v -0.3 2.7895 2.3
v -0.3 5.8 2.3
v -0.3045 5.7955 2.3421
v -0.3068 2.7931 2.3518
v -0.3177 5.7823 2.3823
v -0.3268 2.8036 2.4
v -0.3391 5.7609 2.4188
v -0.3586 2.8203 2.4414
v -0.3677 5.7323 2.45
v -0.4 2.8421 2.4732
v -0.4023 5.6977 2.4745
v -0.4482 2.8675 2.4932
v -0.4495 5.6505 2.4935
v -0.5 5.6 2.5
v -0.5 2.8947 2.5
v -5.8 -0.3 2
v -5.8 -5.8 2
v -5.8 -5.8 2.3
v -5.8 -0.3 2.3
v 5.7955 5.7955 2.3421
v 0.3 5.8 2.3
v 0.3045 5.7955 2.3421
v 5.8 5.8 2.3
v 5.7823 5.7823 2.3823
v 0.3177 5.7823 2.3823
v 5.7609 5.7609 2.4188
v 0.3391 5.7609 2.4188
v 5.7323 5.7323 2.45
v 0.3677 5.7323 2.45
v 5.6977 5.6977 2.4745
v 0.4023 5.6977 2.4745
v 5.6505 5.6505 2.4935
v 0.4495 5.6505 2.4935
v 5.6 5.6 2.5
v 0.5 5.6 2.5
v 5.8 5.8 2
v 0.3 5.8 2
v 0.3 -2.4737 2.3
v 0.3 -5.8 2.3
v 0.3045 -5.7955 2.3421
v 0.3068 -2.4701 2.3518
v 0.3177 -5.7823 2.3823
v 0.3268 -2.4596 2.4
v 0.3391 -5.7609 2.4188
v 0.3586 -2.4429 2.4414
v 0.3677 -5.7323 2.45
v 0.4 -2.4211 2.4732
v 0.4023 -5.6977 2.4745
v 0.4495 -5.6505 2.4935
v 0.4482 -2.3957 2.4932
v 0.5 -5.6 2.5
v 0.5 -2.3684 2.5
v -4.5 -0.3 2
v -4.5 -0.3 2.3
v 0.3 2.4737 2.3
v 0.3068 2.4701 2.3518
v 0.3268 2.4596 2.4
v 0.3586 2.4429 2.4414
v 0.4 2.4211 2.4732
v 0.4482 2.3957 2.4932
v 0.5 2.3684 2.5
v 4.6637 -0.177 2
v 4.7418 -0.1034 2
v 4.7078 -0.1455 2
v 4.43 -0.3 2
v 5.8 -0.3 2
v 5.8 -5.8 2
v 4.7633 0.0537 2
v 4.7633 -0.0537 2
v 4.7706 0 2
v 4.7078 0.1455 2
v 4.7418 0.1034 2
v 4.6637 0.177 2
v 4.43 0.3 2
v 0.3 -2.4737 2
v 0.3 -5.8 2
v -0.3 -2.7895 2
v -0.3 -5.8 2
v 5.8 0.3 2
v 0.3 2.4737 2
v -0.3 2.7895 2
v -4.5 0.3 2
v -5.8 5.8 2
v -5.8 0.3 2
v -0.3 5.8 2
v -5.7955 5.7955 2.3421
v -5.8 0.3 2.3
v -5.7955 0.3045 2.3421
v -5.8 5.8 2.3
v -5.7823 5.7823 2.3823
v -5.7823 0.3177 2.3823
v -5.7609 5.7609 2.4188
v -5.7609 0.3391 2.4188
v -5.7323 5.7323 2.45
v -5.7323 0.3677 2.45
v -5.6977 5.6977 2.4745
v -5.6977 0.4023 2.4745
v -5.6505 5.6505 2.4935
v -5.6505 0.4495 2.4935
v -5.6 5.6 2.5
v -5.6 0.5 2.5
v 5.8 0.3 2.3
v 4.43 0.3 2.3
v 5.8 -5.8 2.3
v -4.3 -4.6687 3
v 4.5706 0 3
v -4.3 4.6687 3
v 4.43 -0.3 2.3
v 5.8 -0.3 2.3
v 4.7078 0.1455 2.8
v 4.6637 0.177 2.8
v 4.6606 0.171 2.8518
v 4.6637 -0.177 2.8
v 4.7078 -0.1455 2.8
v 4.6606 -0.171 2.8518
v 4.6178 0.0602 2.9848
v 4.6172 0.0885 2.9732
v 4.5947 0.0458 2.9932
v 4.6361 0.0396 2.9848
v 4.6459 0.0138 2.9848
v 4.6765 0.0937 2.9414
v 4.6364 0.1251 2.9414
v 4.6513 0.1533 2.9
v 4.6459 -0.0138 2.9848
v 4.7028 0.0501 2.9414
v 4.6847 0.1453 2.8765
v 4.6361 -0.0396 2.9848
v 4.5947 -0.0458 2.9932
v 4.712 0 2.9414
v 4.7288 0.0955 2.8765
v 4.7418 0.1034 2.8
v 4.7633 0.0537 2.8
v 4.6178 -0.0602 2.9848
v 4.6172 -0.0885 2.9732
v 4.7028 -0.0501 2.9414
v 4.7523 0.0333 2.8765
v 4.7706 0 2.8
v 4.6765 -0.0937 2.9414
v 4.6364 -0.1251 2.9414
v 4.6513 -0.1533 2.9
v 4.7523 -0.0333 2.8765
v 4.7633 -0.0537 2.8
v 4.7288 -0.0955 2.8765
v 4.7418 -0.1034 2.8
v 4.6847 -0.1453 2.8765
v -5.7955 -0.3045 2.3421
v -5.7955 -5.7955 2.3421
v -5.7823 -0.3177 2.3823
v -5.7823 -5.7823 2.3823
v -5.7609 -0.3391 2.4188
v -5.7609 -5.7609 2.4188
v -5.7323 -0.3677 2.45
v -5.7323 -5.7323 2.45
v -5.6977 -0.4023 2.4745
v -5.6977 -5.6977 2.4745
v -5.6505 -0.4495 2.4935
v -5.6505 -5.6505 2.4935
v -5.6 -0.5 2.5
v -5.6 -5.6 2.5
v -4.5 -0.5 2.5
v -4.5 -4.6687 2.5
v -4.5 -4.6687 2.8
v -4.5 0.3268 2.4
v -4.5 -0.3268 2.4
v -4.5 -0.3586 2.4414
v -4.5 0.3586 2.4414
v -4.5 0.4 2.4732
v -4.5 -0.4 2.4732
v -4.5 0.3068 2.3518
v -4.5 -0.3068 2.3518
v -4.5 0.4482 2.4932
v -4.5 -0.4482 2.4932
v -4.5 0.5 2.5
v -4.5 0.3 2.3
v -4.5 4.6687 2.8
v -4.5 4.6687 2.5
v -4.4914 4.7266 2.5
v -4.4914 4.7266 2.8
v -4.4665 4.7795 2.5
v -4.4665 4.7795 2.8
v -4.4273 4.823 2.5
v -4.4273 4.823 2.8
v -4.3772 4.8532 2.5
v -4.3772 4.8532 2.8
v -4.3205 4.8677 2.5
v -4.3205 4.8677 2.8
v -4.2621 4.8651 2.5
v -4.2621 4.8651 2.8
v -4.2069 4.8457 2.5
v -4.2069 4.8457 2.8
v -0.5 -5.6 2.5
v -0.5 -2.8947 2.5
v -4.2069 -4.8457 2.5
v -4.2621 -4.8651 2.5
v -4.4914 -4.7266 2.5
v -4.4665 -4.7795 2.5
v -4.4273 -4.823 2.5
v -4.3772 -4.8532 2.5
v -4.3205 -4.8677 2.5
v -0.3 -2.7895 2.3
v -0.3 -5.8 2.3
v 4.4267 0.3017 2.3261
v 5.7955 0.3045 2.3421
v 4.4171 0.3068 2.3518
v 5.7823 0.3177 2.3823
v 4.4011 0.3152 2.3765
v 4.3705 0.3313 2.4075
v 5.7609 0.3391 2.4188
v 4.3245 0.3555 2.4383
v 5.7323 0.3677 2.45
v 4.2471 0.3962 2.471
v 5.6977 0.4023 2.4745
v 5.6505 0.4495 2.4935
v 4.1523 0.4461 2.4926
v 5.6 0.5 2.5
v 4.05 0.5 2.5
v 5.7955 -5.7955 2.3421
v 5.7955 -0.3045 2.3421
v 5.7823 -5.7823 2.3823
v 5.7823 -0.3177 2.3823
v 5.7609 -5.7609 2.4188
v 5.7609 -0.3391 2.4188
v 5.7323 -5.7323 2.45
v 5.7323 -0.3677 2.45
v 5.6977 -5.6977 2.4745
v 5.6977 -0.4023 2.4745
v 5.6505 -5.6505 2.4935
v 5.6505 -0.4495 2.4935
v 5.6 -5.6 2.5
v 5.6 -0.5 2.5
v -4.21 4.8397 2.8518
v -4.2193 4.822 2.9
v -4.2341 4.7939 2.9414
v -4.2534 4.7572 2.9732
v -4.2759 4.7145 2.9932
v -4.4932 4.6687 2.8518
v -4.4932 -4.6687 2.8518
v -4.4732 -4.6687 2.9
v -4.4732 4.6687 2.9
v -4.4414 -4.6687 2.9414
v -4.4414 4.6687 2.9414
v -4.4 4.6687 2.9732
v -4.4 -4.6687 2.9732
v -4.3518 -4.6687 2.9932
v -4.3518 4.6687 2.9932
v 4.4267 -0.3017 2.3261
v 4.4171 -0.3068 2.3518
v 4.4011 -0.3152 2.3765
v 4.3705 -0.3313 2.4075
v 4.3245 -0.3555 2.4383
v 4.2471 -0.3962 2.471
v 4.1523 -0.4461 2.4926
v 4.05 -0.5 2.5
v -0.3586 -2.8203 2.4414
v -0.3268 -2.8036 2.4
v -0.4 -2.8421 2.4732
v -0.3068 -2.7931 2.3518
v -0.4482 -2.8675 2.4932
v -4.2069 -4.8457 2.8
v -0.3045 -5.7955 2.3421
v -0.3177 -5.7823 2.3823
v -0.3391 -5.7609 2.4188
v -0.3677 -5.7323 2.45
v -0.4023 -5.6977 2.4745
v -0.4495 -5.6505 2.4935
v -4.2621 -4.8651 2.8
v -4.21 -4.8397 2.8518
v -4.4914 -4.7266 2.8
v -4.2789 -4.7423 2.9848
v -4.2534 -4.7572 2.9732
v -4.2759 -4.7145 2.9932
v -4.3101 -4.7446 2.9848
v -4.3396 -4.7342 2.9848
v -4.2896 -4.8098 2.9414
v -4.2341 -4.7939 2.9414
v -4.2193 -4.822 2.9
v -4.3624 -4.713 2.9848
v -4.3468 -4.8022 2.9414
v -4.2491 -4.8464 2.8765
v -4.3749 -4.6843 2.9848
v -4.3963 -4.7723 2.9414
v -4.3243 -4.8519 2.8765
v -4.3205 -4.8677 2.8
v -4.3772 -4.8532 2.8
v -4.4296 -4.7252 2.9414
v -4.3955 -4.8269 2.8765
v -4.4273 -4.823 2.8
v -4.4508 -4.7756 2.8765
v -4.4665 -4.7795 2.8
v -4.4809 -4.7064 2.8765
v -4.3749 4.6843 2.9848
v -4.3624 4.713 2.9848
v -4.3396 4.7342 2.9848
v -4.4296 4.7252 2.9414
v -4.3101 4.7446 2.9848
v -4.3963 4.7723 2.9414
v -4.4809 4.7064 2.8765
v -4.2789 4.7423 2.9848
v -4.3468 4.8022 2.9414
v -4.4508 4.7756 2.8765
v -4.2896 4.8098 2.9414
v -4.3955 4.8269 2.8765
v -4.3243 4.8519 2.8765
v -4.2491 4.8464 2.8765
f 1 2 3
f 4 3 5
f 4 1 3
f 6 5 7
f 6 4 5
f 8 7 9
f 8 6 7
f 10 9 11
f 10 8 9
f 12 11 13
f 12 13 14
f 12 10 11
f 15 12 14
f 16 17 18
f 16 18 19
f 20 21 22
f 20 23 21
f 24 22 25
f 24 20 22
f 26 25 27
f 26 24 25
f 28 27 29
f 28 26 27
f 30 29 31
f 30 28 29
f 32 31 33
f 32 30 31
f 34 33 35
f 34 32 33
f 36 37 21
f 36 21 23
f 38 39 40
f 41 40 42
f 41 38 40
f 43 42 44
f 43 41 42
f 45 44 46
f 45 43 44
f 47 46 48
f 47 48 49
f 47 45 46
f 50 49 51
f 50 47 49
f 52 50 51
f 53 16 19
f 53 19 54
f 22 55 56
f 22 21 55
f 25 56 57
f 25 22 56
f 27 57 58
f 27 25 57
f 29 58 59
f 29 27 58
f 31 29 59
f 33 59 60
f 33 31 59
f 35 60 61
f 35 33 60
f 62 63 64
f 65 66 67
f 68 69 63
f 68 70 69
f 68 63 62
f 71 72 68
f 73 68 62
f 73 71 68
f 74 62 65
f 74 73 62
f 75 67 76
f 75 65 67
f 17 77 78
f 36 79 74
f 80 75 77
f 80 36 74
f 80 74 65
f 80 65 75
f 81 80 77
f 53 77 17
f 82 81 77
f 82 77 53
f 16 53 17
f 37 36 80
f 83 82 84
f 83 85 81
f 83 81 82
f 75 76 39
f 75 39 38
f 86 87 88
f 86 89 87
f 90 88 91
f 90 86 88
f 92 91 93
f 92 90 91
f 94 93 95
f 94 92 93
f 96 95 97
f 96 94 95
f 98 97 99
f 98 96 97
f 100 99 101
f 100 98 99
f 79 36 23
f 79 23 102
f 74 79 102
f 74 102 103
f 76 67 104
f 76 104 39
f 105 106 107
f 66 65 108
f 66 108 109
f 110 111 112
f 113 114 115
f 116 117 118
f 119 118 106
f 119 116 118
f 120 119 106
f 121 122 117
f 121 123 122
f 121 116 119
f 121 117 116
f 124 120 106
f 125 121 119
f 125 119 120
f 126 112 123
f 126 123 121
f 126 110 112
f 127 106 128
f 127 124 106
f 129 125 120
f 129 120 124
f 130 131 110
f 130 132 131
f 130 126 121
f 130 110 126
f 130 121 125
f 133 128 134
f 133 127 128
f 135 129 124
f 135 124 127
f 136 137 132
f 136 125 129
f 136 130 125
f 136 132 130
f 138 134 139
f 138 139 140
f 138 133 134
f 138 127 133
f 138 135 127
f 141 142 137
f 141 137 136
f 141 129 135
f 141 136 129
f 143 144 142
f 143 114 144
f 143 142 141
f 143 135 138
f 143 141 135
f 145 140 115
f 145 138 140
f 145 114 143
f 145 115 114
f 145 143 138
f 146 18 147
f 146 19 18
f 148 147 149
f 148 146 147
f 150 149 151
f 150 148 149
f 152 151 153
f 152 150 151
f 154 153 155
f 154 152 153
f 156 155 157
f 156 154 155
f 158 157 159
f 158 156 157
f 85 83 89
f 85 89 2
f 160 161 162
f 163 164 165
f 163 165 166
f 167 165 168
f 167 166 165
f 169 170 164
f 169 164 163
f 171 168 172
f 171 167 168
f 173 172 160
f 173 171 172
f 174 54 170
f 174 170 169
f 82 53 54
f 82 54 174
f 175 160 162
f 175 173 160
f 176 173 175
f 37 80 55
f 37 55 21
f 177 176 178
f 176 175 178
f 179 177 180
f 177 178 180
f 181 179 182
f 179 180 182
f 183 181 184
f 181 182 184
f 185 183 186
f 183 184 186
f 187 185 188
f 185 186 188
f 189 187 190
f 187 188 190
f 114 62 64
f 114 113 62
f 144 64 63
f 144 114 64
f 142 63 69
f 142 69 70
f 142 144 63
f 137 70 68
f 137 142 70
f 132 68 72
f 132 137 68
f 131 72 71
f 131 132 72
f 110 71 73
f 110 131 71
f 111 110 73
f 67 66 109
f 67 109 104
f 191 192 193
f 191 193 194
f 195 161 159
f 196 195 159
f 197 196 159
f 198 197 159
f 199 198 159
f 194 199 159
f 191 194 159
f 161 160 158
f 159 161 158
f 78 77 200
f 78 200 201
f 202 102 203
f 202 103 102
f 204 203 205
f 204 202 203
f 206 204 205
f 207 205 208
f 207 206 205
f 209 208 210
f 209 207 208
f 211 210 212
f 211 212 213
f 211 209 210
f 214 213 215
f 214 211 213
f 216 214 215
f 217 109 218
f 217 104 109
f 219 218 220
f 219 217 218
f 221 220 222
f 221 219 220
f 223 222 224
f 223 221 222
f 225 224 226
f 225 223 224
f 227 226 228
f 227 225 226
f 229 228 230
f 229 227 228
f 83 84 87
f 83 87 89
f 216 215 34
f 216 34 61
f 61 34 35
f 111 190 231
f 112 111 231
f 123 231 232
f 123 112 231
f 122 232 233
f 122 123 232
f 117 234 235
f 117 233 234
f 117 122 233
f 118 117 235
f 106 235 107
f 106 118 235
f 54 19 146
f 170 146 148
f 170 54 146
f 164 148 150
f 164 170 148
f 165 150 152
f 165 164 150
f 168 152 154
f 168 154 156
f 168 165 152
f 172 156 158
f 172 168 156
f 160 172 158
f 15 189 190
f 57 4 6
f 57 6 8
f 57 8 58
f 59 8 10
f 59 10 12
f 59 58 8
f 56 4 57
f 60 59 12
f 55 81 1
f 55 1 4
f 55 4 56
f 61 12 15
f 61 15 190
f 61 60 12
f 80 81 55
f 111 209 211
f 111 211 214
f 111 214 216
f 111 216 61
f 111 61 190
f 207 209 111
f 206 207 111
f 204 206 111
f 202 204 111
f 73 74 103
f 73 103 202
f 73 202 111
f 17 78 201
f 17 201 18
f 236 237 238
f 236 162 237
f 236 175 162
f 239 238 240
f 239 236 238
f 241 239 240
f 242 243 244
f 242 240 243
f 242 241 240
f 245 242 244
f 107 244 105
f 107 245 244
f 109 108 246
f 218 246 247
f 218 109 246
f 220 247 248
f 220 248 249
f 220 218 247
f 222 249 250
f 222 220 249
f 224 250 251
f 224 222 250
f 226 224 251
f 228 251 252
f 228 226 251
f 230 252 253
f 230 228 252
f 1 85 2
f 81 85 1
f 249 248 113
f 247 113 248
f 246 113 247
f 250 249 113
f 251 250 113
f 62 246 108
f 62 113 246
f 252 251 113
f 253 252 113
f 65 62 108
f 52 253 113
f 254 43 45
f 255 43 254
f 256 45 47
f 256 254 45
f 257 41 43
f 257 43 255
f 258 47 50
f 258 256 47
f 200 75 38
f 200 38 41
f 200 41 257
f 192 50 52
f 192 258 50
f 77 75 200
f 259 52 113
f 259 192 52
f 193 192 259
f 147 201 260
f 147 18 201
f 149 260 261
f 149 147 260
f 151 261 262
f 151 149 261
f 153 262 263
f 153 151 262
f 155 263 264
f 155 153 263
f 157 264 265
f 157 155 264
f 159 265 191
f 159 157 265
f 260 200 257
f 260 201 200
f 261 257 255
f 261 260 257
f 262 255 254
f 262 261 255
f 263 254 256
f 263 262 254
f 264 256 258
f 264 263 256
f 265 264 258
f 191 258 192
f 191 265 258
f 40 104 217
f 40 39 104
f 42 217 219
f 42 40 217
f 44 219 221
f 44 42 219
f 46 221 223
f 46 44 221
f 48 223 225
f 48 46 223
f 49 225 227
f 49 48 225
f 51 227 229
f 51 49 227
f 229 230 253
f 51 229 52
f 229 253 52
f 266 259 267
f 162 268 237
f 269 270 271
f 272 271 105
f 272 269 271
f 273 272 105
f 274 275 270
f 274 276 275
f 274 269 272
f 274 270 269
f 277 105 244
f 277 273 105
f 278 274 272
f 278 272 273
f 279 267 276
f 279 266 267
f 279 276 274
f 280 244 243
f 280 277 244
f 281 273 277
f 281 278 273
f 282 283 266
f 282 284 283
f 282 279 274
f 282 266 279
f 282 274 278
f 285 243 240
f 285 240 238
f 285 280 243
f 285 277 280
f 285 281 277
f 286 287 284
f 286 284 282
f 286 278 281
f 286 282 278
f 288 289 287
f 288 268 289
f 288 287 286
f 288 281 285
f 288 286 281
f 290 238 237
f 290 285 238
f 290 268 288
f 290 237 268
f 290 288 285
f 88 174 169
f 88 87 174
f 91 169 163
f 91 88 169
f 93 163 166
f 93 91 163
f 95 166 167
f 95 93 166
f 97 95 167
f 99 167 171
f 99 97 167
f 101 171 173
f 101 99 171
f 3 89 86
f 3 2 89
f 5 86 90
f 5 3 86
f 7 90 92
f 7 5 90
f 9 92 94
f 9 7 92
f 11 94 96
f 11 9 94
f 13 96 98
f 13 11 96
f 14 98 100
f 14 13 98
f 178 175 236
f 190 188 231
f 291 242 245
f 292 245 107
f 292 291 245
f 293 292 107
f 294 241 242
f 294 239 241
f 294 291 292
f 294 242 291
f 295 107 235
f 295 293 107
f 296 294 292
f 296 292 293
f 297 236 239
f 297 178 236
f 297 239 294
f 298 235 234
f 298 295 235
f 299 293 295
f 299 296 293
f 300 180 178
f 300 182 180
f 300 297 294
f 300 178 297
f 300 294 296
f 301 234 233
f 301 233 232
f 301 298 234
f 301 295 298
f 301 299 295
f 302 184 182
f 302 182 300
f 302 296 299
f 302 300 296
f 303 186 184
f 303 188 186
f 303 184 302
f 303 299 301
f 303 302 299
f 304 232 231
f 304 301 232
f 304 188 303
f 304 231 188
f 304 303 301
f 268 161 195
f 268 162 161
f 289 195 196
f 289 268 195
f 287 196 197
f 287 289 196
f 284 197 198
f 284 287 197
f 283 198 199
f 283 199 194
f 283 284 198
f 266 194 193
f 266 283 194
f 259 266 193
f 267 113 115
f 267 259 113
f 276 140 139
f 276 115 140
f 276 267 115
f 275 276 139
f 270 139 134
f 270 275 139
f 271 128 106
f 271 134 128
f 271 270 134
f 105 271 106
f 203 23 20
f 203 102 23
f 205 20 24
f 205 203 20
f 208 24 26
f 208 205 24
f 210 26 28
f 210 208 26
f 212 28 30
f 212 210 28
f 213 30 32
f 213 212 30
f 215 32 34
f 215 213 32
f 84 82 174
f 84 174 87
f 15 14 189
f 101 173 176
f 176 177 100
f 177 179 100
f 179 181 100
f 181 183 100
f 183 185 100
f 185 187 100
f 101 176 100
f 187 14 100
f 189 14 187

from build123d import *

# Parameters (mm, degrees)
PAD001_DEPTH = 1
PAD002_DEPTH = 0.5
FILLET003_R  = 0.2


with BuildPart() as pfeil_rechts:
    # Sketch008 → Pad001 (new body)
    with BuildSketch(Plane.XY):
        Polygon((-4.5, 5), (5, 0), (-4.5, -5), align=None)
    extrude(amount=PAD001_DEPTH)


with BuildPart() as pfeil_rechts_1:
    # Body003 placement: moved
    add(pfeil_rechts.part.moved(Location((0, 0, 2))))


with BuildPart() as bild_windows:
    # Sketch009 → Pad002 (new body)
    with BuildSketch(Plane.XY.offset(2)):
        Polygon((-5.8, 5.8), (-0.3, 5.8), (-0.3, 0.8), (0.3, 0.8), (0.3, 5.8), (5.8, 5.8), (5.8, 0.3), (0.8, 0.3), (0.8, -0.3), (5.8, -0.3), (5.8, -5.8), (0.3, -5.8), (0.3, -0.8), (-0.3, -0.8), (-0.3, -5.8), (-5.8, -5.8), (-5.8, -0.3), (-0.8, -0.3), (-0.8, 0.3), (-5.8, 0.3), align=None)
    extrude(amount=PAD002_DEPTH)

    # Fusion: union Pfeil rechts
    add(pfeil_rechts_1.part)

    # Fillet003
    fillet003_edges = [bild_windows.edges().sort_by_distance(p)[0] for p in [
        (-3.05, 5.8, 2.5),
        (-5.8, 3.05, 2.5),
        (-0.3, 4.294737, 2.5),
        (-5.15, 0.3, 2.5),
        (5, 0, 2.5),
        (0.25, 2.5, 3),
        (-4.5, 5, 2.75),
        (-4.5, 0, 3),
        (-4.5, -5, 2.75),
        (0.3, 4.136842, 2.5),
        (5.115, 0.3, 2.5),
        (5.8, 3.05, 2.5),
        (3.05, 5.8, 2.5),
        (0.25, -2.5, 3),
        (-5.15, -0.3, 2.5),
        (-5.8, -3.05, 2.5),
        (-3.05, -5.8, 2.5),
        (-0.3, -4.294737, 2.5),
        (5.115, -0.3, 2.5),
        (0.3, -4.136842, 2.5),
        (3.05, -5.8, 2.5),
        (5.8, -3.05, 2.5),
    ]]
    fillet(fillet003_edges, radius=FILLET003_R)


solid = bild_windows.part
